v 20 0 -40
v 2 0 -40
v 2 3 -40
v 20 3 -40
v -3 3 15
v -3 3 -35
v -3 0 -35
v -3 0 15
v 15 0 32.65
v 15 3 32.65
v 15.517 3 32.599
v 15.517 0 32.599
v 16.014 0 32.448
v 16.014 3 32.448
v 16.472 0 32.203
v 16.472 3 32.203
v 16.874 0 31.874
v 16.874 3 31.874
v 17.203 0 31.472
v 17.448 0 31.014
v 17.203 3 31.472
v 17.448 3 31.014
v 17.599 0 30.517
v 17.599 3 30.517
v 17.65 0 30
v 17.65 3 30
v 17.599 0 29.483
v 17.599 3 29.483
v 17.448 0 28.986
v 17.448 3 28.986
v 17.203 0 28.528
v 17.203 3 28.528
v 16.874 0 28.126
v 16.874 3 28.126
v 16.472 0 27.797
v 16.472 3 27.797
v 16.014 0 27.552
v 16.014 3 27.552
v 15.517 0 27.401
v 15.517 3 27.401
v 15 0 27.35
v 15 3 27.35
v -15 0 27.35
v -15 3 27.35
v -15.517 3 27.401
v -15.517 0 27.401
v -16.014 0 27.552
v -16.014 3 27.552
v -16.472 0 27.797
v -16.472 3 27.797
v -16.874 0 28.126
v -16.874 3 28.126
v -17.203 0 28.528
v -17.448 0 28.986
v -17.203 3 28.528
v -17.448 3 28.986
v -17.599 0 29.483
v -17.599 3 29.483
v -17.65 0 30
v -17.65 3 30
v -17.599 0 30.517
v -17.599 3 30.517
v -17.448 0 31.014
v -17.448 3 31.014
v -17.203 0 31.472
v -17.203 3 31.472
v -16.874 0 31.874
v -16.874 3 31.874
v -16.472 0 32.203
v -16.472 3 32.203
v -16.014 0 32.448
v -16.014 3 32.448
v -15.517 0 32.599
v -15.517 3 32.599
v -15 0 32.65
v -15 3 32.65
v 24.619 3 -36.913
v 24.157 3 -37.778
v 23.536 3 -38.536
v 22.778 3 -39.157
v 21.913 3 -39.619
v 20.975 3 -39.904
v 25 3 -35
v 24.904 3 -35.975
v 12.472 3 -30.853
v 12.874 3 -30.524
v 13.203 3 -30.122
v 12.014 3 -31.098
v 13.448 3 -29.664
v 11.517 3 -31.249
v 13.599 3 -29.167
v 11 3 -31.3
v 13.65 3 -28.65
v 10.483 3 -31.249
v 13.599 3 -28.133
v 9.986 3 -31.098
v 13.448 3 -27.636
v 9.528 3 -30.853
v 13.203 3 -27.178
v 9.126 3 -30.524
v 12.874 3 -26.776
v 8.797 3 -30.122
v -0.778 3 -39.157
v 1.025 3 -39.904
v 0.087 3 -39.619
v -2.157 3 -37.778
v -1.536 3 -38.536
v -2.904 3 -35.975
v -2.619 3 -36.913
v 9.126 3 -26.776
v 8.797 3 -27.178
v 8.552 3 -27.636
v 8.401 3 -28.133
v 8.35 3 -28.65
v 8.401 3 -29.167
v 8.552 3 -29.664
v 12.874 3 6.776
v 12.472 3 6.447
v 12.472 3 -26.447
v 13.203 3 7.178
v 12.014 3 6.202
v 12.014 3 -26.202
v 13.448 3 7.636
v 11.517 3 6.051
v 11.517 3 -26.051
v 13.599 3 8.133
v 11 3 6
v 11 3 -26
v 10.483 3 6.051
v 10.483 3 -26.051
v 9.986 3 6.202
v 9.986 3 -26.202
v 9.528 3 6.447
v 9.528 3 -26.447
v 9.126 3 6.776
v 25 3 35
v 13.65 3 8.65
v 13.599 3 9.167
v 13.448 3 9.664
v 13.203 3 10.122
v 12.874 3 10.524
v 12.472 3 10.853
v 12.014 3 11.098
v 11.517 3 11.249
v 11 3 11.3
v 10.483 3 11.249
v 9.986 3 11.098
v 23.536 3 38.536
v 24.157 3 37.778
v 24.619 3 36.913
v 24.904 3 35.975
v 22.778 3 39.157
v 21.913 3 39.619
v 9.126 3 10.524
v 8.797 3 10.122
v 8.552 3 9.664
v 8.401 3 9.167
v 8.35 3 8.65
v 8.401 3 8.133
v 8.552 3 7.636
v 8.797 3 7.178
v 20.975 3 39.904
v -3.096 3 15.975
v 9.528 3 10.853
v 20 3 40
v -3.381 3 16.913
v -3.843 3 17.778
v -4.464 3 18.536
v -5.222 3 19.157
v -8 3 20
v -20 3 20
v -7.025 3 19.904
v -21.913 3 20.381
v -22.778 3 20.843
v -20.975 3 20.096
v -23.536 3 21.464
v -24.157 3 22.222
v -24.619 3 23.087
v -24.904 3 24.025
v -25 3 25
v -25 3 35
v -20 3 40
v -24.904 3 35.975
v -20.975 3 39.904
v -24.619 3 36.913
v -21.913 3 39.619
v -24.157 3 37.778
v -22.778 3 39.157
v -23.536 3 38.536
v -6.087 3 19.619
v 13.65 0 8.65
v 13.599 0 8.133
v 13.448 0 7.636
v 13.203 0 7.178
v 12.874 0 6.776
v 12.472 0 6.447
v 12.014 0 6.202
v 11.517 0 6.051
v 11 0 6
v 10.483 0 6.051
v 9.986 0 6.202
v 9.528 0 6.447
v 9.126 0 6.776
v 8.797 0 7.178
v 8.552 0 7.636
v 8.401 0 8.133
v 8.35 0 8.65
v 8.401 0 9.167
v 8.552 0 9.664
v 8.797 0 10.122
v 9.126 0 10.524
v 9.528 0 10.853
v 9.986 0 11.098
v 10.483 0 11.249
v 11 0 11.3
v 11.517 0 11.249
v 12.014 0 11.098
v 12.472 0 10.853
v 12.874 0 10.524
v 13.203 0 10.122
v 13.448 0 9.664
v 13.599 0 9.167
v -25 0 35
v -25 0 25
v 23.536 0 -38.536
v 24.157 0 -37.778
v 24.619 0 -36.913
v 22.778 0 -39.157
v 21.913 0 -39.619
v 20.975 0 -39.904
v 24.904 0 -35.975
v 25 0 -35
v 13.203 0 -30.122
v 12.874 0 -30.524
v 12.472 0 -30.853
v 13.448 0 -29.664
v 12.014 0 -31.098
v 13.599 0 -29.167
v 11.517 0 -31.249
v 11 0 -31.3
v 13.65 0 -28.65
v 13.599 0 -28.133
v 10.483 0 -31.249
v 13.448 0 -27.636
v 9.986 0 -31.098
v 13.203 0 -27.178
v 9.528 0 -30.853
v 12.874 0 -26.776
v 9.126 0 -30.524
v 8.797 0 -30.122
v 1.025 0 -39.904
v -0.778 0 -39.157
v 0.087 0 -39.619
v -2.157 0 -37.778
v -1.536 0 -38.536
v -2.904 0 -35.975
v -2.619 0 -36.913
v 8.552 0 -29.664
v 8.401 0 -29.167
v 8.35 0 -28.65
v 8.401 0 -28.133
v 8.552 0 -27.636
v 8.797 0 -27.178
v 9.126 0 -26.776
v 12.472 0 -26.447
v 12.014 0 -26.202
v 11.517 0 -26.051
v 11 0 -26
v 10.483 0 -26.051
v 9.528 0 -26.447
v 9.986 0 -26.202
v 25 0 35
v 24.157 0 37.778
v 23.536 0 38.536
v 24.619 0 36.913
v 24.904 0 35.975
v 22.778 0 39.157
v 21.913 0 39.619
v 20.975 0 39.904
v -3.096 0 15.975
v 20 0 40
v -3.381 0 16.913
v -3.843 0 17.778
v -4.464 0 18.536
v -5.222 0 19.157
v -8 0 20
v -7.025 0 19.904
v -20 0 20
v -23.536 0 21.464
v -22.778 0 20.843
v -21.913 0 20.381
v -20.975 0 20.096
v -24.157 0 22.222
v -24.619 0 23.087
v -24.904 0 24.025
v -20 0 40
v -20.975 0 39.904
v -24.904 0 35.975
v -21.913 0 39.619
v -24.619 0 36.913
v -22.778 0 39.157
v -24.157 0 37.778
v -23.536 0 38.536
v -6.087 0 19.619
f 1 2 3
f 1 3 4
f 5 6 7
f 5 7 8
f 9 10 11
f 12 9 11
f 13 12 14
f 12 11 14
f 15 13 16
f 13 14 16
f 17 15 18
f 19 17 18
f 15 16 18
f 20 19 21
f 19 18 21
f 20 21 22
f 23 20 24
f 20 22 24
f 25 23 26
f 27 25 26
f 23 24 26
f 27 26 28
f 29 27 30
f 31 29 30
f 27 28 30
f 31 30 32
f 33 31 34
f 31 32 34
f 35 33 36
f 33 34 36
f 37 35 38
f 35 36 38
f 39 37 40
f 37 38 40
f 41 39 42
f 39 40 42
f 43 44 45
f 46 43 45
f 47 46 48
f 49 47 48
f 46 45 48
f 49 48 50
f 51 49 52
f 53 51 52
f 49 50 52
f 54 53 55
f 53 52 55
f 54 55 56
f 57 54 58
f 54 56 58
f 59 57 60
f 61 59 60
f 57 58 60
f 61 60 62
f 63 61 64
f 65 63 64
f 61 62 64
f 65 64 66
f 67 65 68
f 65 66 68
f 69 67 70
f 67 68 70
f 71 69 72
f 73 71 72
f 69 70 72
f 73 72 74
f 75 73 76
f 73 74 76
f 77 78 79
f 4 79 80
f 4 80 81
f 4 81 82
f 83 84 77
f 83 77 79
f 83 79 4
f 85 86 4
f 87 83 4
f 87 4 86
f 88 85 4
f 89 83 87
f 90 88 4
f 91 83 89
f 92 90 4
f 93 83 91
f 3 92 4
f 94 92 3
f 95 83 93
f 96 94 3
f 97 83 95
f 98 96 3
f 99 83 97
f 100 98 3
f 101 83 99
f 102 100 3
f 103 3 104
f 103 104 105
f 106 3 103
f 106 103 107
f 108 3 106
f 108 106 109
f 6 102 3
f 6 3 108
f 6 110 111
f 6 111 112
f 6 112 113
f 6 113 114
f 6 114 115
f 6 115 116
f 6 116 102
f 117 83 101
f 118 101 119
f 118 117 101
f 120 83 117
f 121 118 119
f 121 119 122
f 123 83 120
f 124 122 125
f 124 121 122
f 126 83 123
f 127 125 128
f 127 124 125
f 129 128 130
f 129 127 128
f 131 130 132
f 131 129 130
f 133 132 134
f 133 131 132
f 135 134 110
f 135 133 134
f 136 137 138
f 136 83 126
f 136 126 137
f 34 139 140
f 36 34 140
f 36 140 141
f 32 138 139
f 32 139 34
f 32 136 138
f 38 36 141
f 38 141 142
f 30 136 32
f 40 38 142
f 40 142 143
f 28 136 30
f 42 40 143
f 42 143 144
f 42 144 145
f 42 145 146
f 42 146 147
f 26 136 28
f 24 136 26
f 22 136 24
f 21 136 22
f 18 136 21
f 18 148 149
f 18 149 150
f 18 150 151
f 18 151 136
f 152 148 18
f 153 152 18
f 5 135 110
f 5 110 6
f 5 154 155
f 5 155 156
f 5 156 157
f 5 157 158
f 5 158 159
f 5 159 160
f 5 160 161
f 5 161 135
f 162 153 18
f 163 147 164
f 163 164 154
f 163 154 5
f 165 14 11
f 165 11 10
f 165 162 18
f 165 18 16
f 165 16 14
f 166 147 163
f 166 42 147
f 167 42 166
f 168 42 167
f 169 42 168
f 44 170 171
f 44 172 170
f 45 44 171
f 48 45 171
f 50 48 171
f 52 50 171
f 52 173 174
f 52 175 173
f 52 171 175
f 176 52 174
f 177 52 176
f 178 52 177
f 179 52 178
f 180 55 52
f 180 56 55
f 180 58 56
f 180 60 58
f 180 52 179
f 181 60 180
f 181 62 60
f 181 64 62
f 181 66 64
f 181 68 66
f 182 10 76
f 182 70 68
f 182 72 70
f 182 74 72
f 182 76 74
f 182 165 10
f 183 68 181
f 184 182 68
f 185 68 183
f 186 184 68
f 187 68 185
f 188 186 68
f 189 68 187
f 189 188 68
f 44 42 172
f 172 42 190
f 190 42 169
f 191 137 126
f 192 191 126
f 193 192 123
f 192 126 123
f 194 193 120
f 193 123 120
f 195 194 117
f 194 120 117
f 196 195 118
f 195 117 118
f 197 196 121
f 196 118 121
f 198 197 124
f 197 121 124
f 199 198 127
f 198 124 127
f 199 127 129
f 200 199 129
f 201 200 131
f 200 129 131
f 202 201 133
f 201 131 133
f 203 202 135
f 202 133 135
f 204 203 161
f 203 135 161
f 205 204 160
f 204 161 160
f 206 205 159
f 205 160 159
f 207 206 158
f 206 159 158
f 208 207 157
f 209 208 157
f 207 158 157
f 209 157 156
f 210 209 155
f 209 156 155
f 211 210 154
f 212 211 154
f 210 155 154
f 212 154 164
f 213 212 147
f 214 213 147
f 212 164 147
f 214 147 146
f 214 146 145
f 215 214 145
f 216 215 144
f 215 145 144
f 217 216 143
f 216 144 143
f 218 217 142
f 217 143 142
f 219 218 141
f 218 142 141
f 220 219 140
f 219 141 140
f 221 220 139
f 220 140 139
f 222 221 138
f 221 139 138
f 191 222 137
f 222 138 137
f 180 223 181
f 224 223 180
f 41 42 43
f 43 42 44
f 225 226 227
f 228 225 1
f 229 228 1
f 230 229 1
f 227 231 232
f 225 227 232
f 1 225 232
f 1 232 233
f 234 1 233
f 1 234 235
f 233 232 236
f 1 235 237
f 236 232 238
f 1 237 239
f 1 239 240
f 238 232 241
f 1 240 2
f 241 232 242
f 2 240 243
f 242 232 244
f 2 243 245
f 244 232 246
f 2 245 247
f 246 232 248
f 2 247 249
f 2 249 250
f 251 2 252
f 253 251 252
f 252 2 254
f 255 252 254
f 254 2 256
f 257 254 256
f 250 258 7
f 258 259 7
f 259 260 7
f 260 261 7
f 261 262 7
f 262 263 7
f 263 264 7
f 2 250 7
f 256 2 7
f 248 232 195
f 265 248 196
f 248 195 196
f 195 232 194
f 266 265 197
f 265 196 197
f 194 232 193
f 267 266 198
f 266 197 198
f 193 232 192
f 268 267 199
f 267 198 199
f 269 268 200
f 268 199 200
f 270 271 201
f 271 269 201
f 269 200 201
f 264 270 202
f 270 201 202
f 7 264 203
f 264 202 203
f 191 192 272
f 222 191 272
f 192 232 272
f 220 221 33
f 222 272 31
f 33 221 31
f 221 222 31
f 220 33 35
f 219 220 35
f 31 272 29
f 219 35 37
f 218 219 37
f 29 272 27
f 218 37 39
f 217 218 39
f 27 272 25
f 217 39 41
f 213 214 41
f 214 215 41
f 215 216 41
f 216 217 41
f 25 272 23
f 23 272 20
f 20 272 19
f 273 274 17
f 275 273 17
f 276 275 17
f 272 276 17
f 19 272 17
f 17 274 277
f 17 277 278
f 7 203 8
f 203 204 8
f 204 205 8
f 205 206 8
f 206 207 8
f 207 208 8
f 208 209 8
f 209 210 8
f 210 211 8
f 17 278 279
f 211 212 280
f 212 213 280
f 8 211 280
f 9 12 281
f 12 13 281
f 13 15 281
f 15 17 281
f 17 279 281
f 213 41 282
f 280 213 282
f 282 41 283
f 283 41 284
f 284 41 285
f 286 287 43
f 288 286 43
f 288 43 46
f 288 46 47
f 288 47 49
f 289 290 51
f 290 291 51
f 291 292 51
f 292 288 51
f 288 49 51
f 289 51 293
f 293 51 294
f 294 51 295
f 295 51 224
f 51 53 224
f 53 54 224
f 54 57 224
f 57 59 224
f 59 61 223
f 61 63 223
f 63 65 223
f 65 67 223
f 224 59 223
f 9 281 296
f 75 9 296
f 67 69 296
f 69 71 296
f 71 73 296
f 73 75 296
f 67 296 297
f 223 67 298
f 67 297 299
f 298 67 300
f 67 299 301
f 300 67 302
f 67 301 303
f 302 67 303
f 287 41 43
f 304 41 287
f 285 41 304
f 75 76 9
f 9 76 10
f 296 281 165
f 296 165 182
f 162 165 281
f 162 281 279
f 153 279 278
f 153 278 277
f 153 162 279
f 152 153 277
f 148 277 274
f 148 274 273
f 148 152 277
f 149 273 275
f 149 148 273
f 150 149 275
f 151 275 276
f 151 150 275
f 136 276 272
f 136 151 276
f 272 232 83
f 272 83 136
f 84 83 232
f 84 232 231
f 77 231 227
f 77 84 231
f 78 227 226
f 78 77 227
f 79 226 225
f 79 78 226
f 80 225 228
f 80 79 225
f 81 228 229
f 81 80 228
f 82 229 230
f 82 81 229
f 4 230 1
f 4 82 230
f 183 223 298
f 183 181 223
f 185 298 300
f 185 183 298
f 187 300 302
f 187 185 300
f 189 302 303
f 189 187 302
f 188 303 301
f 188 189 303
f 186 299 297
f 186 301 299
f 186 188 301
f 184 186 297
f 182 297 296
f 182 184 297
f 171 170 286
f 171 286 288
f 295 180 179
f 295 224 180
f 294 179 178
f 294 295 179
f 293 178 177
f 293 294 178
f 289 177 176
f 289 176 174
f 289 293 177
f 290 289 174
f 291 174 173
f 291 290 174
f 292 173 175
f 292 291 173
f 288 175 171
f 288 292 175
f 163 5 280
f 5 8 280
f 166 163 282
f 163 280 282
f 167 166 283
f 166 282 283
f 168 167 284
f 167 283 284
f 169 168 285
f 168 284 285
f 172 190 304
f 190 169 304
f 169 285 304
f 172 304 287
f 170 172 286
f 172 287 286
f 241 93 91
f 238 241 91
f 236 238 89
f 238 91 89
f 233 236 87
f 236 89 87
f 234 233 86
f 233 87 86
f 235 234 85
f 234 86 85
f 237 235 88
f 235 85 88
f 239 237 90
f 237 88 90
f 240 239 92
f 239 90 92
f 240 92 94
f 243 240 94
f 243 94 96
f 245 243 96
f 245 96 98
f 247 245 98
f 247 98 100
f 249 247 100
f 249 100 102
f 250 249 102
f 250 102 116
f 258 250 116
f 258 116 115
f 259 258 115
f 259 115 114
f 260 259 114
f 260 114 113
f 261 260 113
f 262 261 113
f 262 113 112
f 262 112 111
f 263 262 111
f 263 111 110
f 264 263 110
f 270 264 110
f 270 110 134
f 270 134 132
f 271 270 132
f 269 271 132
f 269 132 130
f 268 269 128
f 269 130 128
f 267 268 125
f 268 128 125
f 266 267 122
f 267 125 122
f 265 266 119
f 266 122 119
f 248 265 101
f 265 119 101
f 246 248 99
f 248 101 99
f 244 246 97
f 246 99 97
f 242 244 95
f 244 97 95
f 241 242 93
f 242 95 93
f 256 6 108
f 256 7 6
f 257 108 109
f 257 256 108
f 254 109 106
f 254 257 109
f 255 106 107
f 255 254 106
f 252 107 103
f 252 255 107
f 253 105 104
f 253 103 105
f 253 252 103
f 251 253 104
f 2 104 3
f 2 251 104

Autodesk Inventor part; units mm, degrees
ref_plane "YZ Plane" through (0, 0, 0) normal (1, 0, 0) x (0, 1, 0)
ref_plane "XZ Plane" through (0, 0, 0) normal (0, 1, 0) x (-1, 0, 0)
ref_plane "XY Plane" through (0, 0, 0) normal (0, 0, 1) x (1, 0, 0)
sketch "Sketch1" plane through (0, 0, 0) normal (0, 1, 0) x (-1, 0, 0)
  line L0 (-25, 40) -> (25, 40)
  line L1 (25, 40) -> (25, -40)
  line L2 (25, -40) -> (-25, -40)
  line L3 (-25, -40) -> (-25, 40)
  line L4 (-25, 40) -> (25, -40) construction
  line L5 (25, 40) -> (-25, -40) construction
  point P0 (0, 0)
  dimension "d0" = 50
  dimension "d1" = 80
extrude "Extrusion1" add sketch "Sketch1" along normal blind 3
sketch "Sketch2" plane through (0, 3, 0) normal (0, 1, 0) x (1, 0, 0)
  line L0 (25, -40) -> (25, 40) projected
  line L1 (25, 40) -> (11, 40)
  line L2 (11, 40) -> (11, 28.65)
  line L3 (11, 28.65) -> (25, 28.65)
  line L4 (25, 28.65) -> (25, 40)
  line L5 (11, 28.65) -> (11, -8.65)
  circle A0 centre (11, 28.65) radius 2.65
  circle A1 centre (11, -8.65) radius 2.65
  line L6 (-25, -40) -> (25, -40) projected
  line L7 (-25, 40) -> (-25, -40) projected
  line L8 (25, -40) -> (-25, -40)
  line L9 (-25, -40) -> (-25, -30)
  line L10 (-25, -30) -> (25, -30)
  line L11 (25, -30) -> (25, -40)
  line L12 (25, -30) -> (15, -30)
  line L13 (-25, -30) -> (-15, -30)
  line L14 (-15, -30) -> (15, -30) construction
  line L15 (-15, -32.65) -> (15, -32.65)
  line L16 (15, -27.35) -> (-15, -27.35)
  arc A2 (-15, -27.35) -> (-15, -32.65) centre (-15, -30) ccw
  arc A3 (15, -32.65) -> (15, -27.35) centre (15, -30) ccw
  line L17 (-25, -30) -> (-25, 40)
  line L18 (-25, 40) -> (-3, 40)
  line L19 (-3, 40) -> (-3, -20)
  line L20 (-3, -20) -> (-25, -20)
  point P0 (0, 0)
  point P1 (0, -30)
  dimension "d4" = 14
  dimension "d5" = 11.35
  dimension "d6" = 37.3
  dimension "d7" = 5.3
  dimension "d8" = 5.3
  dimension "d9" = 10
  dimension "d10" = 10
  dimension "d11" = 10
  dimension "d12" = 5.3
  dimension "d13" = 22
  dimension "d14" = 60
extrude "Extrusion2" cut sketch "Sketch2" against normal through all contours L7 L18 L19 L20 | A1 | A3 L15 A2 L10 | L10 A2 L16 A3 | A0 L5 L3 | L3 L2 A0 | L5 A0 L2
fillet "Fillet1" radius 5 6 edges at (-25, 1.5, 40) (25, 1.5, 40) (25, 1.5, -40) (-3, 1.5, -40) (-3, 1.5, 20) (-25, 1.5, 20)
properties part number "LeadScrewEndMount"
